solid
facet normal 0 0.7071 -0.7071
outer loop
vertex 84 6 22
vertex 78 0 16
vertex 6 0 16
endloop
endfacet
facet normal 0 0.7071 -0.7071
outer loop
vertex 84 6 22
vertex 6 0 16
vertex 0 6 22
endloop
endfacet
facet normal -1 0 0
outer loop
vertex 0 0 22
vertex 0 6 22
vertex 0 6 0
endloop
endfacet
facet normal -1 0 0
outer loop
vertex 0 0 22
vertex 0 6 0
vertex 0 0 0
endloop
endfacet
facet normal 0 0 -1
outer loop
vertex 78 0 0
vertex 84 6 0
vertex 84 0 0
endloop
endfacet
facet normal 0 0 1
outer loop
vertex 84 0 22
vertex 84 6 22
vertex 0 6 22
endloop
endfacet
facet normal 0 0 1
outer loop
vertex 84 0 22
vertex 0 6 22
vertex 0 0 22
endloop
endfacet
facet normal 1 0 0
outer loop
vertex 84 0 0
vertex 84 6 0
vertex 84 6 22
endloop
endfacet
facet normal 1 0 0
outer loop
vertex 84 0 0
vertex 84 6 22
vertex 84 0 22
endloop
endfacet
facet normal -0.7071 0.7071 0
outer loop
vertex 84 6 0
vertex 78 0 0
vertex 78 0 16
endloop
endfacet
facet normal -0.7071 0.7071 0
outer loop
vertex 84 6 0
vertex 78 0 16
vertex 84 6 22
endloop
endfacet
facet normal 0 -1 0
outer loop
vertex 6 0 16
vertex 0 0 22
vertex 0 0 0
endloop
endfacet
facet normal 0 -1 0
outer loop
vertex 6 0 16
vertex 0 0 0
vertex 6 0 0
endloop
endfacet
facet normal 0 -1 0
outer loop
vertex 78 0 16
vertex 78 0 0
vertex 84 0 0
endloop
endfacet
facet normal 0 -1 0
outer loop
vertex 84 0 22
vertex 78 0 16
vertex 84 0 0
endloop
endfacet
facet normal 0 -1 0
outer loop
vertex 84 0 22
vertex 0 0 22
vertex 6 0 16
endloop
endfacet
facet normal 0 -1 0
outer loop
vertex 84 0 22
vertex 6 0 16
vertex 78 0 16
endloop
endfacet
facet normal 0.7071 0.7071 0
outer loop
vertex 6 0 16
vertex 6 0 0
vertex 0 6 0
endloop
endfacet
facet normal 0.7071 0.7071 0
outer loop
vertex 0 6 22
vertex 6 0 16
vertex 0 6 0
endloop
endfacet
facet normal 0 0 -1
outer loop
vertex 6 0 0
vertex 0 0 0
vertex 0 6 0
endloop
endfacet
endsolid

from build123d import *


with BuildPart() as part:
    # По траектории1: sweep along a path in Эскиз1
    with BuildLine(Plane(origin=(0, 0, 0), x_dir=(1, 0, 0), z_dir=(0, 1, 0))) as sweep_1_path:
        Line((0, 0), (0, -22))
        Line((0, -22), (84, -22))
        Line((84, -22), (84, 0))
    # Эскиз2 → По траектории1 (sweep)
    with BuildSketch(Plane.XY):
        Polygon((6, 0), (0, 0), (0, 6), align=None)
    sweep(path=sweep_1_path.line, transition=Transition.RIGHT)


solid = part.part
